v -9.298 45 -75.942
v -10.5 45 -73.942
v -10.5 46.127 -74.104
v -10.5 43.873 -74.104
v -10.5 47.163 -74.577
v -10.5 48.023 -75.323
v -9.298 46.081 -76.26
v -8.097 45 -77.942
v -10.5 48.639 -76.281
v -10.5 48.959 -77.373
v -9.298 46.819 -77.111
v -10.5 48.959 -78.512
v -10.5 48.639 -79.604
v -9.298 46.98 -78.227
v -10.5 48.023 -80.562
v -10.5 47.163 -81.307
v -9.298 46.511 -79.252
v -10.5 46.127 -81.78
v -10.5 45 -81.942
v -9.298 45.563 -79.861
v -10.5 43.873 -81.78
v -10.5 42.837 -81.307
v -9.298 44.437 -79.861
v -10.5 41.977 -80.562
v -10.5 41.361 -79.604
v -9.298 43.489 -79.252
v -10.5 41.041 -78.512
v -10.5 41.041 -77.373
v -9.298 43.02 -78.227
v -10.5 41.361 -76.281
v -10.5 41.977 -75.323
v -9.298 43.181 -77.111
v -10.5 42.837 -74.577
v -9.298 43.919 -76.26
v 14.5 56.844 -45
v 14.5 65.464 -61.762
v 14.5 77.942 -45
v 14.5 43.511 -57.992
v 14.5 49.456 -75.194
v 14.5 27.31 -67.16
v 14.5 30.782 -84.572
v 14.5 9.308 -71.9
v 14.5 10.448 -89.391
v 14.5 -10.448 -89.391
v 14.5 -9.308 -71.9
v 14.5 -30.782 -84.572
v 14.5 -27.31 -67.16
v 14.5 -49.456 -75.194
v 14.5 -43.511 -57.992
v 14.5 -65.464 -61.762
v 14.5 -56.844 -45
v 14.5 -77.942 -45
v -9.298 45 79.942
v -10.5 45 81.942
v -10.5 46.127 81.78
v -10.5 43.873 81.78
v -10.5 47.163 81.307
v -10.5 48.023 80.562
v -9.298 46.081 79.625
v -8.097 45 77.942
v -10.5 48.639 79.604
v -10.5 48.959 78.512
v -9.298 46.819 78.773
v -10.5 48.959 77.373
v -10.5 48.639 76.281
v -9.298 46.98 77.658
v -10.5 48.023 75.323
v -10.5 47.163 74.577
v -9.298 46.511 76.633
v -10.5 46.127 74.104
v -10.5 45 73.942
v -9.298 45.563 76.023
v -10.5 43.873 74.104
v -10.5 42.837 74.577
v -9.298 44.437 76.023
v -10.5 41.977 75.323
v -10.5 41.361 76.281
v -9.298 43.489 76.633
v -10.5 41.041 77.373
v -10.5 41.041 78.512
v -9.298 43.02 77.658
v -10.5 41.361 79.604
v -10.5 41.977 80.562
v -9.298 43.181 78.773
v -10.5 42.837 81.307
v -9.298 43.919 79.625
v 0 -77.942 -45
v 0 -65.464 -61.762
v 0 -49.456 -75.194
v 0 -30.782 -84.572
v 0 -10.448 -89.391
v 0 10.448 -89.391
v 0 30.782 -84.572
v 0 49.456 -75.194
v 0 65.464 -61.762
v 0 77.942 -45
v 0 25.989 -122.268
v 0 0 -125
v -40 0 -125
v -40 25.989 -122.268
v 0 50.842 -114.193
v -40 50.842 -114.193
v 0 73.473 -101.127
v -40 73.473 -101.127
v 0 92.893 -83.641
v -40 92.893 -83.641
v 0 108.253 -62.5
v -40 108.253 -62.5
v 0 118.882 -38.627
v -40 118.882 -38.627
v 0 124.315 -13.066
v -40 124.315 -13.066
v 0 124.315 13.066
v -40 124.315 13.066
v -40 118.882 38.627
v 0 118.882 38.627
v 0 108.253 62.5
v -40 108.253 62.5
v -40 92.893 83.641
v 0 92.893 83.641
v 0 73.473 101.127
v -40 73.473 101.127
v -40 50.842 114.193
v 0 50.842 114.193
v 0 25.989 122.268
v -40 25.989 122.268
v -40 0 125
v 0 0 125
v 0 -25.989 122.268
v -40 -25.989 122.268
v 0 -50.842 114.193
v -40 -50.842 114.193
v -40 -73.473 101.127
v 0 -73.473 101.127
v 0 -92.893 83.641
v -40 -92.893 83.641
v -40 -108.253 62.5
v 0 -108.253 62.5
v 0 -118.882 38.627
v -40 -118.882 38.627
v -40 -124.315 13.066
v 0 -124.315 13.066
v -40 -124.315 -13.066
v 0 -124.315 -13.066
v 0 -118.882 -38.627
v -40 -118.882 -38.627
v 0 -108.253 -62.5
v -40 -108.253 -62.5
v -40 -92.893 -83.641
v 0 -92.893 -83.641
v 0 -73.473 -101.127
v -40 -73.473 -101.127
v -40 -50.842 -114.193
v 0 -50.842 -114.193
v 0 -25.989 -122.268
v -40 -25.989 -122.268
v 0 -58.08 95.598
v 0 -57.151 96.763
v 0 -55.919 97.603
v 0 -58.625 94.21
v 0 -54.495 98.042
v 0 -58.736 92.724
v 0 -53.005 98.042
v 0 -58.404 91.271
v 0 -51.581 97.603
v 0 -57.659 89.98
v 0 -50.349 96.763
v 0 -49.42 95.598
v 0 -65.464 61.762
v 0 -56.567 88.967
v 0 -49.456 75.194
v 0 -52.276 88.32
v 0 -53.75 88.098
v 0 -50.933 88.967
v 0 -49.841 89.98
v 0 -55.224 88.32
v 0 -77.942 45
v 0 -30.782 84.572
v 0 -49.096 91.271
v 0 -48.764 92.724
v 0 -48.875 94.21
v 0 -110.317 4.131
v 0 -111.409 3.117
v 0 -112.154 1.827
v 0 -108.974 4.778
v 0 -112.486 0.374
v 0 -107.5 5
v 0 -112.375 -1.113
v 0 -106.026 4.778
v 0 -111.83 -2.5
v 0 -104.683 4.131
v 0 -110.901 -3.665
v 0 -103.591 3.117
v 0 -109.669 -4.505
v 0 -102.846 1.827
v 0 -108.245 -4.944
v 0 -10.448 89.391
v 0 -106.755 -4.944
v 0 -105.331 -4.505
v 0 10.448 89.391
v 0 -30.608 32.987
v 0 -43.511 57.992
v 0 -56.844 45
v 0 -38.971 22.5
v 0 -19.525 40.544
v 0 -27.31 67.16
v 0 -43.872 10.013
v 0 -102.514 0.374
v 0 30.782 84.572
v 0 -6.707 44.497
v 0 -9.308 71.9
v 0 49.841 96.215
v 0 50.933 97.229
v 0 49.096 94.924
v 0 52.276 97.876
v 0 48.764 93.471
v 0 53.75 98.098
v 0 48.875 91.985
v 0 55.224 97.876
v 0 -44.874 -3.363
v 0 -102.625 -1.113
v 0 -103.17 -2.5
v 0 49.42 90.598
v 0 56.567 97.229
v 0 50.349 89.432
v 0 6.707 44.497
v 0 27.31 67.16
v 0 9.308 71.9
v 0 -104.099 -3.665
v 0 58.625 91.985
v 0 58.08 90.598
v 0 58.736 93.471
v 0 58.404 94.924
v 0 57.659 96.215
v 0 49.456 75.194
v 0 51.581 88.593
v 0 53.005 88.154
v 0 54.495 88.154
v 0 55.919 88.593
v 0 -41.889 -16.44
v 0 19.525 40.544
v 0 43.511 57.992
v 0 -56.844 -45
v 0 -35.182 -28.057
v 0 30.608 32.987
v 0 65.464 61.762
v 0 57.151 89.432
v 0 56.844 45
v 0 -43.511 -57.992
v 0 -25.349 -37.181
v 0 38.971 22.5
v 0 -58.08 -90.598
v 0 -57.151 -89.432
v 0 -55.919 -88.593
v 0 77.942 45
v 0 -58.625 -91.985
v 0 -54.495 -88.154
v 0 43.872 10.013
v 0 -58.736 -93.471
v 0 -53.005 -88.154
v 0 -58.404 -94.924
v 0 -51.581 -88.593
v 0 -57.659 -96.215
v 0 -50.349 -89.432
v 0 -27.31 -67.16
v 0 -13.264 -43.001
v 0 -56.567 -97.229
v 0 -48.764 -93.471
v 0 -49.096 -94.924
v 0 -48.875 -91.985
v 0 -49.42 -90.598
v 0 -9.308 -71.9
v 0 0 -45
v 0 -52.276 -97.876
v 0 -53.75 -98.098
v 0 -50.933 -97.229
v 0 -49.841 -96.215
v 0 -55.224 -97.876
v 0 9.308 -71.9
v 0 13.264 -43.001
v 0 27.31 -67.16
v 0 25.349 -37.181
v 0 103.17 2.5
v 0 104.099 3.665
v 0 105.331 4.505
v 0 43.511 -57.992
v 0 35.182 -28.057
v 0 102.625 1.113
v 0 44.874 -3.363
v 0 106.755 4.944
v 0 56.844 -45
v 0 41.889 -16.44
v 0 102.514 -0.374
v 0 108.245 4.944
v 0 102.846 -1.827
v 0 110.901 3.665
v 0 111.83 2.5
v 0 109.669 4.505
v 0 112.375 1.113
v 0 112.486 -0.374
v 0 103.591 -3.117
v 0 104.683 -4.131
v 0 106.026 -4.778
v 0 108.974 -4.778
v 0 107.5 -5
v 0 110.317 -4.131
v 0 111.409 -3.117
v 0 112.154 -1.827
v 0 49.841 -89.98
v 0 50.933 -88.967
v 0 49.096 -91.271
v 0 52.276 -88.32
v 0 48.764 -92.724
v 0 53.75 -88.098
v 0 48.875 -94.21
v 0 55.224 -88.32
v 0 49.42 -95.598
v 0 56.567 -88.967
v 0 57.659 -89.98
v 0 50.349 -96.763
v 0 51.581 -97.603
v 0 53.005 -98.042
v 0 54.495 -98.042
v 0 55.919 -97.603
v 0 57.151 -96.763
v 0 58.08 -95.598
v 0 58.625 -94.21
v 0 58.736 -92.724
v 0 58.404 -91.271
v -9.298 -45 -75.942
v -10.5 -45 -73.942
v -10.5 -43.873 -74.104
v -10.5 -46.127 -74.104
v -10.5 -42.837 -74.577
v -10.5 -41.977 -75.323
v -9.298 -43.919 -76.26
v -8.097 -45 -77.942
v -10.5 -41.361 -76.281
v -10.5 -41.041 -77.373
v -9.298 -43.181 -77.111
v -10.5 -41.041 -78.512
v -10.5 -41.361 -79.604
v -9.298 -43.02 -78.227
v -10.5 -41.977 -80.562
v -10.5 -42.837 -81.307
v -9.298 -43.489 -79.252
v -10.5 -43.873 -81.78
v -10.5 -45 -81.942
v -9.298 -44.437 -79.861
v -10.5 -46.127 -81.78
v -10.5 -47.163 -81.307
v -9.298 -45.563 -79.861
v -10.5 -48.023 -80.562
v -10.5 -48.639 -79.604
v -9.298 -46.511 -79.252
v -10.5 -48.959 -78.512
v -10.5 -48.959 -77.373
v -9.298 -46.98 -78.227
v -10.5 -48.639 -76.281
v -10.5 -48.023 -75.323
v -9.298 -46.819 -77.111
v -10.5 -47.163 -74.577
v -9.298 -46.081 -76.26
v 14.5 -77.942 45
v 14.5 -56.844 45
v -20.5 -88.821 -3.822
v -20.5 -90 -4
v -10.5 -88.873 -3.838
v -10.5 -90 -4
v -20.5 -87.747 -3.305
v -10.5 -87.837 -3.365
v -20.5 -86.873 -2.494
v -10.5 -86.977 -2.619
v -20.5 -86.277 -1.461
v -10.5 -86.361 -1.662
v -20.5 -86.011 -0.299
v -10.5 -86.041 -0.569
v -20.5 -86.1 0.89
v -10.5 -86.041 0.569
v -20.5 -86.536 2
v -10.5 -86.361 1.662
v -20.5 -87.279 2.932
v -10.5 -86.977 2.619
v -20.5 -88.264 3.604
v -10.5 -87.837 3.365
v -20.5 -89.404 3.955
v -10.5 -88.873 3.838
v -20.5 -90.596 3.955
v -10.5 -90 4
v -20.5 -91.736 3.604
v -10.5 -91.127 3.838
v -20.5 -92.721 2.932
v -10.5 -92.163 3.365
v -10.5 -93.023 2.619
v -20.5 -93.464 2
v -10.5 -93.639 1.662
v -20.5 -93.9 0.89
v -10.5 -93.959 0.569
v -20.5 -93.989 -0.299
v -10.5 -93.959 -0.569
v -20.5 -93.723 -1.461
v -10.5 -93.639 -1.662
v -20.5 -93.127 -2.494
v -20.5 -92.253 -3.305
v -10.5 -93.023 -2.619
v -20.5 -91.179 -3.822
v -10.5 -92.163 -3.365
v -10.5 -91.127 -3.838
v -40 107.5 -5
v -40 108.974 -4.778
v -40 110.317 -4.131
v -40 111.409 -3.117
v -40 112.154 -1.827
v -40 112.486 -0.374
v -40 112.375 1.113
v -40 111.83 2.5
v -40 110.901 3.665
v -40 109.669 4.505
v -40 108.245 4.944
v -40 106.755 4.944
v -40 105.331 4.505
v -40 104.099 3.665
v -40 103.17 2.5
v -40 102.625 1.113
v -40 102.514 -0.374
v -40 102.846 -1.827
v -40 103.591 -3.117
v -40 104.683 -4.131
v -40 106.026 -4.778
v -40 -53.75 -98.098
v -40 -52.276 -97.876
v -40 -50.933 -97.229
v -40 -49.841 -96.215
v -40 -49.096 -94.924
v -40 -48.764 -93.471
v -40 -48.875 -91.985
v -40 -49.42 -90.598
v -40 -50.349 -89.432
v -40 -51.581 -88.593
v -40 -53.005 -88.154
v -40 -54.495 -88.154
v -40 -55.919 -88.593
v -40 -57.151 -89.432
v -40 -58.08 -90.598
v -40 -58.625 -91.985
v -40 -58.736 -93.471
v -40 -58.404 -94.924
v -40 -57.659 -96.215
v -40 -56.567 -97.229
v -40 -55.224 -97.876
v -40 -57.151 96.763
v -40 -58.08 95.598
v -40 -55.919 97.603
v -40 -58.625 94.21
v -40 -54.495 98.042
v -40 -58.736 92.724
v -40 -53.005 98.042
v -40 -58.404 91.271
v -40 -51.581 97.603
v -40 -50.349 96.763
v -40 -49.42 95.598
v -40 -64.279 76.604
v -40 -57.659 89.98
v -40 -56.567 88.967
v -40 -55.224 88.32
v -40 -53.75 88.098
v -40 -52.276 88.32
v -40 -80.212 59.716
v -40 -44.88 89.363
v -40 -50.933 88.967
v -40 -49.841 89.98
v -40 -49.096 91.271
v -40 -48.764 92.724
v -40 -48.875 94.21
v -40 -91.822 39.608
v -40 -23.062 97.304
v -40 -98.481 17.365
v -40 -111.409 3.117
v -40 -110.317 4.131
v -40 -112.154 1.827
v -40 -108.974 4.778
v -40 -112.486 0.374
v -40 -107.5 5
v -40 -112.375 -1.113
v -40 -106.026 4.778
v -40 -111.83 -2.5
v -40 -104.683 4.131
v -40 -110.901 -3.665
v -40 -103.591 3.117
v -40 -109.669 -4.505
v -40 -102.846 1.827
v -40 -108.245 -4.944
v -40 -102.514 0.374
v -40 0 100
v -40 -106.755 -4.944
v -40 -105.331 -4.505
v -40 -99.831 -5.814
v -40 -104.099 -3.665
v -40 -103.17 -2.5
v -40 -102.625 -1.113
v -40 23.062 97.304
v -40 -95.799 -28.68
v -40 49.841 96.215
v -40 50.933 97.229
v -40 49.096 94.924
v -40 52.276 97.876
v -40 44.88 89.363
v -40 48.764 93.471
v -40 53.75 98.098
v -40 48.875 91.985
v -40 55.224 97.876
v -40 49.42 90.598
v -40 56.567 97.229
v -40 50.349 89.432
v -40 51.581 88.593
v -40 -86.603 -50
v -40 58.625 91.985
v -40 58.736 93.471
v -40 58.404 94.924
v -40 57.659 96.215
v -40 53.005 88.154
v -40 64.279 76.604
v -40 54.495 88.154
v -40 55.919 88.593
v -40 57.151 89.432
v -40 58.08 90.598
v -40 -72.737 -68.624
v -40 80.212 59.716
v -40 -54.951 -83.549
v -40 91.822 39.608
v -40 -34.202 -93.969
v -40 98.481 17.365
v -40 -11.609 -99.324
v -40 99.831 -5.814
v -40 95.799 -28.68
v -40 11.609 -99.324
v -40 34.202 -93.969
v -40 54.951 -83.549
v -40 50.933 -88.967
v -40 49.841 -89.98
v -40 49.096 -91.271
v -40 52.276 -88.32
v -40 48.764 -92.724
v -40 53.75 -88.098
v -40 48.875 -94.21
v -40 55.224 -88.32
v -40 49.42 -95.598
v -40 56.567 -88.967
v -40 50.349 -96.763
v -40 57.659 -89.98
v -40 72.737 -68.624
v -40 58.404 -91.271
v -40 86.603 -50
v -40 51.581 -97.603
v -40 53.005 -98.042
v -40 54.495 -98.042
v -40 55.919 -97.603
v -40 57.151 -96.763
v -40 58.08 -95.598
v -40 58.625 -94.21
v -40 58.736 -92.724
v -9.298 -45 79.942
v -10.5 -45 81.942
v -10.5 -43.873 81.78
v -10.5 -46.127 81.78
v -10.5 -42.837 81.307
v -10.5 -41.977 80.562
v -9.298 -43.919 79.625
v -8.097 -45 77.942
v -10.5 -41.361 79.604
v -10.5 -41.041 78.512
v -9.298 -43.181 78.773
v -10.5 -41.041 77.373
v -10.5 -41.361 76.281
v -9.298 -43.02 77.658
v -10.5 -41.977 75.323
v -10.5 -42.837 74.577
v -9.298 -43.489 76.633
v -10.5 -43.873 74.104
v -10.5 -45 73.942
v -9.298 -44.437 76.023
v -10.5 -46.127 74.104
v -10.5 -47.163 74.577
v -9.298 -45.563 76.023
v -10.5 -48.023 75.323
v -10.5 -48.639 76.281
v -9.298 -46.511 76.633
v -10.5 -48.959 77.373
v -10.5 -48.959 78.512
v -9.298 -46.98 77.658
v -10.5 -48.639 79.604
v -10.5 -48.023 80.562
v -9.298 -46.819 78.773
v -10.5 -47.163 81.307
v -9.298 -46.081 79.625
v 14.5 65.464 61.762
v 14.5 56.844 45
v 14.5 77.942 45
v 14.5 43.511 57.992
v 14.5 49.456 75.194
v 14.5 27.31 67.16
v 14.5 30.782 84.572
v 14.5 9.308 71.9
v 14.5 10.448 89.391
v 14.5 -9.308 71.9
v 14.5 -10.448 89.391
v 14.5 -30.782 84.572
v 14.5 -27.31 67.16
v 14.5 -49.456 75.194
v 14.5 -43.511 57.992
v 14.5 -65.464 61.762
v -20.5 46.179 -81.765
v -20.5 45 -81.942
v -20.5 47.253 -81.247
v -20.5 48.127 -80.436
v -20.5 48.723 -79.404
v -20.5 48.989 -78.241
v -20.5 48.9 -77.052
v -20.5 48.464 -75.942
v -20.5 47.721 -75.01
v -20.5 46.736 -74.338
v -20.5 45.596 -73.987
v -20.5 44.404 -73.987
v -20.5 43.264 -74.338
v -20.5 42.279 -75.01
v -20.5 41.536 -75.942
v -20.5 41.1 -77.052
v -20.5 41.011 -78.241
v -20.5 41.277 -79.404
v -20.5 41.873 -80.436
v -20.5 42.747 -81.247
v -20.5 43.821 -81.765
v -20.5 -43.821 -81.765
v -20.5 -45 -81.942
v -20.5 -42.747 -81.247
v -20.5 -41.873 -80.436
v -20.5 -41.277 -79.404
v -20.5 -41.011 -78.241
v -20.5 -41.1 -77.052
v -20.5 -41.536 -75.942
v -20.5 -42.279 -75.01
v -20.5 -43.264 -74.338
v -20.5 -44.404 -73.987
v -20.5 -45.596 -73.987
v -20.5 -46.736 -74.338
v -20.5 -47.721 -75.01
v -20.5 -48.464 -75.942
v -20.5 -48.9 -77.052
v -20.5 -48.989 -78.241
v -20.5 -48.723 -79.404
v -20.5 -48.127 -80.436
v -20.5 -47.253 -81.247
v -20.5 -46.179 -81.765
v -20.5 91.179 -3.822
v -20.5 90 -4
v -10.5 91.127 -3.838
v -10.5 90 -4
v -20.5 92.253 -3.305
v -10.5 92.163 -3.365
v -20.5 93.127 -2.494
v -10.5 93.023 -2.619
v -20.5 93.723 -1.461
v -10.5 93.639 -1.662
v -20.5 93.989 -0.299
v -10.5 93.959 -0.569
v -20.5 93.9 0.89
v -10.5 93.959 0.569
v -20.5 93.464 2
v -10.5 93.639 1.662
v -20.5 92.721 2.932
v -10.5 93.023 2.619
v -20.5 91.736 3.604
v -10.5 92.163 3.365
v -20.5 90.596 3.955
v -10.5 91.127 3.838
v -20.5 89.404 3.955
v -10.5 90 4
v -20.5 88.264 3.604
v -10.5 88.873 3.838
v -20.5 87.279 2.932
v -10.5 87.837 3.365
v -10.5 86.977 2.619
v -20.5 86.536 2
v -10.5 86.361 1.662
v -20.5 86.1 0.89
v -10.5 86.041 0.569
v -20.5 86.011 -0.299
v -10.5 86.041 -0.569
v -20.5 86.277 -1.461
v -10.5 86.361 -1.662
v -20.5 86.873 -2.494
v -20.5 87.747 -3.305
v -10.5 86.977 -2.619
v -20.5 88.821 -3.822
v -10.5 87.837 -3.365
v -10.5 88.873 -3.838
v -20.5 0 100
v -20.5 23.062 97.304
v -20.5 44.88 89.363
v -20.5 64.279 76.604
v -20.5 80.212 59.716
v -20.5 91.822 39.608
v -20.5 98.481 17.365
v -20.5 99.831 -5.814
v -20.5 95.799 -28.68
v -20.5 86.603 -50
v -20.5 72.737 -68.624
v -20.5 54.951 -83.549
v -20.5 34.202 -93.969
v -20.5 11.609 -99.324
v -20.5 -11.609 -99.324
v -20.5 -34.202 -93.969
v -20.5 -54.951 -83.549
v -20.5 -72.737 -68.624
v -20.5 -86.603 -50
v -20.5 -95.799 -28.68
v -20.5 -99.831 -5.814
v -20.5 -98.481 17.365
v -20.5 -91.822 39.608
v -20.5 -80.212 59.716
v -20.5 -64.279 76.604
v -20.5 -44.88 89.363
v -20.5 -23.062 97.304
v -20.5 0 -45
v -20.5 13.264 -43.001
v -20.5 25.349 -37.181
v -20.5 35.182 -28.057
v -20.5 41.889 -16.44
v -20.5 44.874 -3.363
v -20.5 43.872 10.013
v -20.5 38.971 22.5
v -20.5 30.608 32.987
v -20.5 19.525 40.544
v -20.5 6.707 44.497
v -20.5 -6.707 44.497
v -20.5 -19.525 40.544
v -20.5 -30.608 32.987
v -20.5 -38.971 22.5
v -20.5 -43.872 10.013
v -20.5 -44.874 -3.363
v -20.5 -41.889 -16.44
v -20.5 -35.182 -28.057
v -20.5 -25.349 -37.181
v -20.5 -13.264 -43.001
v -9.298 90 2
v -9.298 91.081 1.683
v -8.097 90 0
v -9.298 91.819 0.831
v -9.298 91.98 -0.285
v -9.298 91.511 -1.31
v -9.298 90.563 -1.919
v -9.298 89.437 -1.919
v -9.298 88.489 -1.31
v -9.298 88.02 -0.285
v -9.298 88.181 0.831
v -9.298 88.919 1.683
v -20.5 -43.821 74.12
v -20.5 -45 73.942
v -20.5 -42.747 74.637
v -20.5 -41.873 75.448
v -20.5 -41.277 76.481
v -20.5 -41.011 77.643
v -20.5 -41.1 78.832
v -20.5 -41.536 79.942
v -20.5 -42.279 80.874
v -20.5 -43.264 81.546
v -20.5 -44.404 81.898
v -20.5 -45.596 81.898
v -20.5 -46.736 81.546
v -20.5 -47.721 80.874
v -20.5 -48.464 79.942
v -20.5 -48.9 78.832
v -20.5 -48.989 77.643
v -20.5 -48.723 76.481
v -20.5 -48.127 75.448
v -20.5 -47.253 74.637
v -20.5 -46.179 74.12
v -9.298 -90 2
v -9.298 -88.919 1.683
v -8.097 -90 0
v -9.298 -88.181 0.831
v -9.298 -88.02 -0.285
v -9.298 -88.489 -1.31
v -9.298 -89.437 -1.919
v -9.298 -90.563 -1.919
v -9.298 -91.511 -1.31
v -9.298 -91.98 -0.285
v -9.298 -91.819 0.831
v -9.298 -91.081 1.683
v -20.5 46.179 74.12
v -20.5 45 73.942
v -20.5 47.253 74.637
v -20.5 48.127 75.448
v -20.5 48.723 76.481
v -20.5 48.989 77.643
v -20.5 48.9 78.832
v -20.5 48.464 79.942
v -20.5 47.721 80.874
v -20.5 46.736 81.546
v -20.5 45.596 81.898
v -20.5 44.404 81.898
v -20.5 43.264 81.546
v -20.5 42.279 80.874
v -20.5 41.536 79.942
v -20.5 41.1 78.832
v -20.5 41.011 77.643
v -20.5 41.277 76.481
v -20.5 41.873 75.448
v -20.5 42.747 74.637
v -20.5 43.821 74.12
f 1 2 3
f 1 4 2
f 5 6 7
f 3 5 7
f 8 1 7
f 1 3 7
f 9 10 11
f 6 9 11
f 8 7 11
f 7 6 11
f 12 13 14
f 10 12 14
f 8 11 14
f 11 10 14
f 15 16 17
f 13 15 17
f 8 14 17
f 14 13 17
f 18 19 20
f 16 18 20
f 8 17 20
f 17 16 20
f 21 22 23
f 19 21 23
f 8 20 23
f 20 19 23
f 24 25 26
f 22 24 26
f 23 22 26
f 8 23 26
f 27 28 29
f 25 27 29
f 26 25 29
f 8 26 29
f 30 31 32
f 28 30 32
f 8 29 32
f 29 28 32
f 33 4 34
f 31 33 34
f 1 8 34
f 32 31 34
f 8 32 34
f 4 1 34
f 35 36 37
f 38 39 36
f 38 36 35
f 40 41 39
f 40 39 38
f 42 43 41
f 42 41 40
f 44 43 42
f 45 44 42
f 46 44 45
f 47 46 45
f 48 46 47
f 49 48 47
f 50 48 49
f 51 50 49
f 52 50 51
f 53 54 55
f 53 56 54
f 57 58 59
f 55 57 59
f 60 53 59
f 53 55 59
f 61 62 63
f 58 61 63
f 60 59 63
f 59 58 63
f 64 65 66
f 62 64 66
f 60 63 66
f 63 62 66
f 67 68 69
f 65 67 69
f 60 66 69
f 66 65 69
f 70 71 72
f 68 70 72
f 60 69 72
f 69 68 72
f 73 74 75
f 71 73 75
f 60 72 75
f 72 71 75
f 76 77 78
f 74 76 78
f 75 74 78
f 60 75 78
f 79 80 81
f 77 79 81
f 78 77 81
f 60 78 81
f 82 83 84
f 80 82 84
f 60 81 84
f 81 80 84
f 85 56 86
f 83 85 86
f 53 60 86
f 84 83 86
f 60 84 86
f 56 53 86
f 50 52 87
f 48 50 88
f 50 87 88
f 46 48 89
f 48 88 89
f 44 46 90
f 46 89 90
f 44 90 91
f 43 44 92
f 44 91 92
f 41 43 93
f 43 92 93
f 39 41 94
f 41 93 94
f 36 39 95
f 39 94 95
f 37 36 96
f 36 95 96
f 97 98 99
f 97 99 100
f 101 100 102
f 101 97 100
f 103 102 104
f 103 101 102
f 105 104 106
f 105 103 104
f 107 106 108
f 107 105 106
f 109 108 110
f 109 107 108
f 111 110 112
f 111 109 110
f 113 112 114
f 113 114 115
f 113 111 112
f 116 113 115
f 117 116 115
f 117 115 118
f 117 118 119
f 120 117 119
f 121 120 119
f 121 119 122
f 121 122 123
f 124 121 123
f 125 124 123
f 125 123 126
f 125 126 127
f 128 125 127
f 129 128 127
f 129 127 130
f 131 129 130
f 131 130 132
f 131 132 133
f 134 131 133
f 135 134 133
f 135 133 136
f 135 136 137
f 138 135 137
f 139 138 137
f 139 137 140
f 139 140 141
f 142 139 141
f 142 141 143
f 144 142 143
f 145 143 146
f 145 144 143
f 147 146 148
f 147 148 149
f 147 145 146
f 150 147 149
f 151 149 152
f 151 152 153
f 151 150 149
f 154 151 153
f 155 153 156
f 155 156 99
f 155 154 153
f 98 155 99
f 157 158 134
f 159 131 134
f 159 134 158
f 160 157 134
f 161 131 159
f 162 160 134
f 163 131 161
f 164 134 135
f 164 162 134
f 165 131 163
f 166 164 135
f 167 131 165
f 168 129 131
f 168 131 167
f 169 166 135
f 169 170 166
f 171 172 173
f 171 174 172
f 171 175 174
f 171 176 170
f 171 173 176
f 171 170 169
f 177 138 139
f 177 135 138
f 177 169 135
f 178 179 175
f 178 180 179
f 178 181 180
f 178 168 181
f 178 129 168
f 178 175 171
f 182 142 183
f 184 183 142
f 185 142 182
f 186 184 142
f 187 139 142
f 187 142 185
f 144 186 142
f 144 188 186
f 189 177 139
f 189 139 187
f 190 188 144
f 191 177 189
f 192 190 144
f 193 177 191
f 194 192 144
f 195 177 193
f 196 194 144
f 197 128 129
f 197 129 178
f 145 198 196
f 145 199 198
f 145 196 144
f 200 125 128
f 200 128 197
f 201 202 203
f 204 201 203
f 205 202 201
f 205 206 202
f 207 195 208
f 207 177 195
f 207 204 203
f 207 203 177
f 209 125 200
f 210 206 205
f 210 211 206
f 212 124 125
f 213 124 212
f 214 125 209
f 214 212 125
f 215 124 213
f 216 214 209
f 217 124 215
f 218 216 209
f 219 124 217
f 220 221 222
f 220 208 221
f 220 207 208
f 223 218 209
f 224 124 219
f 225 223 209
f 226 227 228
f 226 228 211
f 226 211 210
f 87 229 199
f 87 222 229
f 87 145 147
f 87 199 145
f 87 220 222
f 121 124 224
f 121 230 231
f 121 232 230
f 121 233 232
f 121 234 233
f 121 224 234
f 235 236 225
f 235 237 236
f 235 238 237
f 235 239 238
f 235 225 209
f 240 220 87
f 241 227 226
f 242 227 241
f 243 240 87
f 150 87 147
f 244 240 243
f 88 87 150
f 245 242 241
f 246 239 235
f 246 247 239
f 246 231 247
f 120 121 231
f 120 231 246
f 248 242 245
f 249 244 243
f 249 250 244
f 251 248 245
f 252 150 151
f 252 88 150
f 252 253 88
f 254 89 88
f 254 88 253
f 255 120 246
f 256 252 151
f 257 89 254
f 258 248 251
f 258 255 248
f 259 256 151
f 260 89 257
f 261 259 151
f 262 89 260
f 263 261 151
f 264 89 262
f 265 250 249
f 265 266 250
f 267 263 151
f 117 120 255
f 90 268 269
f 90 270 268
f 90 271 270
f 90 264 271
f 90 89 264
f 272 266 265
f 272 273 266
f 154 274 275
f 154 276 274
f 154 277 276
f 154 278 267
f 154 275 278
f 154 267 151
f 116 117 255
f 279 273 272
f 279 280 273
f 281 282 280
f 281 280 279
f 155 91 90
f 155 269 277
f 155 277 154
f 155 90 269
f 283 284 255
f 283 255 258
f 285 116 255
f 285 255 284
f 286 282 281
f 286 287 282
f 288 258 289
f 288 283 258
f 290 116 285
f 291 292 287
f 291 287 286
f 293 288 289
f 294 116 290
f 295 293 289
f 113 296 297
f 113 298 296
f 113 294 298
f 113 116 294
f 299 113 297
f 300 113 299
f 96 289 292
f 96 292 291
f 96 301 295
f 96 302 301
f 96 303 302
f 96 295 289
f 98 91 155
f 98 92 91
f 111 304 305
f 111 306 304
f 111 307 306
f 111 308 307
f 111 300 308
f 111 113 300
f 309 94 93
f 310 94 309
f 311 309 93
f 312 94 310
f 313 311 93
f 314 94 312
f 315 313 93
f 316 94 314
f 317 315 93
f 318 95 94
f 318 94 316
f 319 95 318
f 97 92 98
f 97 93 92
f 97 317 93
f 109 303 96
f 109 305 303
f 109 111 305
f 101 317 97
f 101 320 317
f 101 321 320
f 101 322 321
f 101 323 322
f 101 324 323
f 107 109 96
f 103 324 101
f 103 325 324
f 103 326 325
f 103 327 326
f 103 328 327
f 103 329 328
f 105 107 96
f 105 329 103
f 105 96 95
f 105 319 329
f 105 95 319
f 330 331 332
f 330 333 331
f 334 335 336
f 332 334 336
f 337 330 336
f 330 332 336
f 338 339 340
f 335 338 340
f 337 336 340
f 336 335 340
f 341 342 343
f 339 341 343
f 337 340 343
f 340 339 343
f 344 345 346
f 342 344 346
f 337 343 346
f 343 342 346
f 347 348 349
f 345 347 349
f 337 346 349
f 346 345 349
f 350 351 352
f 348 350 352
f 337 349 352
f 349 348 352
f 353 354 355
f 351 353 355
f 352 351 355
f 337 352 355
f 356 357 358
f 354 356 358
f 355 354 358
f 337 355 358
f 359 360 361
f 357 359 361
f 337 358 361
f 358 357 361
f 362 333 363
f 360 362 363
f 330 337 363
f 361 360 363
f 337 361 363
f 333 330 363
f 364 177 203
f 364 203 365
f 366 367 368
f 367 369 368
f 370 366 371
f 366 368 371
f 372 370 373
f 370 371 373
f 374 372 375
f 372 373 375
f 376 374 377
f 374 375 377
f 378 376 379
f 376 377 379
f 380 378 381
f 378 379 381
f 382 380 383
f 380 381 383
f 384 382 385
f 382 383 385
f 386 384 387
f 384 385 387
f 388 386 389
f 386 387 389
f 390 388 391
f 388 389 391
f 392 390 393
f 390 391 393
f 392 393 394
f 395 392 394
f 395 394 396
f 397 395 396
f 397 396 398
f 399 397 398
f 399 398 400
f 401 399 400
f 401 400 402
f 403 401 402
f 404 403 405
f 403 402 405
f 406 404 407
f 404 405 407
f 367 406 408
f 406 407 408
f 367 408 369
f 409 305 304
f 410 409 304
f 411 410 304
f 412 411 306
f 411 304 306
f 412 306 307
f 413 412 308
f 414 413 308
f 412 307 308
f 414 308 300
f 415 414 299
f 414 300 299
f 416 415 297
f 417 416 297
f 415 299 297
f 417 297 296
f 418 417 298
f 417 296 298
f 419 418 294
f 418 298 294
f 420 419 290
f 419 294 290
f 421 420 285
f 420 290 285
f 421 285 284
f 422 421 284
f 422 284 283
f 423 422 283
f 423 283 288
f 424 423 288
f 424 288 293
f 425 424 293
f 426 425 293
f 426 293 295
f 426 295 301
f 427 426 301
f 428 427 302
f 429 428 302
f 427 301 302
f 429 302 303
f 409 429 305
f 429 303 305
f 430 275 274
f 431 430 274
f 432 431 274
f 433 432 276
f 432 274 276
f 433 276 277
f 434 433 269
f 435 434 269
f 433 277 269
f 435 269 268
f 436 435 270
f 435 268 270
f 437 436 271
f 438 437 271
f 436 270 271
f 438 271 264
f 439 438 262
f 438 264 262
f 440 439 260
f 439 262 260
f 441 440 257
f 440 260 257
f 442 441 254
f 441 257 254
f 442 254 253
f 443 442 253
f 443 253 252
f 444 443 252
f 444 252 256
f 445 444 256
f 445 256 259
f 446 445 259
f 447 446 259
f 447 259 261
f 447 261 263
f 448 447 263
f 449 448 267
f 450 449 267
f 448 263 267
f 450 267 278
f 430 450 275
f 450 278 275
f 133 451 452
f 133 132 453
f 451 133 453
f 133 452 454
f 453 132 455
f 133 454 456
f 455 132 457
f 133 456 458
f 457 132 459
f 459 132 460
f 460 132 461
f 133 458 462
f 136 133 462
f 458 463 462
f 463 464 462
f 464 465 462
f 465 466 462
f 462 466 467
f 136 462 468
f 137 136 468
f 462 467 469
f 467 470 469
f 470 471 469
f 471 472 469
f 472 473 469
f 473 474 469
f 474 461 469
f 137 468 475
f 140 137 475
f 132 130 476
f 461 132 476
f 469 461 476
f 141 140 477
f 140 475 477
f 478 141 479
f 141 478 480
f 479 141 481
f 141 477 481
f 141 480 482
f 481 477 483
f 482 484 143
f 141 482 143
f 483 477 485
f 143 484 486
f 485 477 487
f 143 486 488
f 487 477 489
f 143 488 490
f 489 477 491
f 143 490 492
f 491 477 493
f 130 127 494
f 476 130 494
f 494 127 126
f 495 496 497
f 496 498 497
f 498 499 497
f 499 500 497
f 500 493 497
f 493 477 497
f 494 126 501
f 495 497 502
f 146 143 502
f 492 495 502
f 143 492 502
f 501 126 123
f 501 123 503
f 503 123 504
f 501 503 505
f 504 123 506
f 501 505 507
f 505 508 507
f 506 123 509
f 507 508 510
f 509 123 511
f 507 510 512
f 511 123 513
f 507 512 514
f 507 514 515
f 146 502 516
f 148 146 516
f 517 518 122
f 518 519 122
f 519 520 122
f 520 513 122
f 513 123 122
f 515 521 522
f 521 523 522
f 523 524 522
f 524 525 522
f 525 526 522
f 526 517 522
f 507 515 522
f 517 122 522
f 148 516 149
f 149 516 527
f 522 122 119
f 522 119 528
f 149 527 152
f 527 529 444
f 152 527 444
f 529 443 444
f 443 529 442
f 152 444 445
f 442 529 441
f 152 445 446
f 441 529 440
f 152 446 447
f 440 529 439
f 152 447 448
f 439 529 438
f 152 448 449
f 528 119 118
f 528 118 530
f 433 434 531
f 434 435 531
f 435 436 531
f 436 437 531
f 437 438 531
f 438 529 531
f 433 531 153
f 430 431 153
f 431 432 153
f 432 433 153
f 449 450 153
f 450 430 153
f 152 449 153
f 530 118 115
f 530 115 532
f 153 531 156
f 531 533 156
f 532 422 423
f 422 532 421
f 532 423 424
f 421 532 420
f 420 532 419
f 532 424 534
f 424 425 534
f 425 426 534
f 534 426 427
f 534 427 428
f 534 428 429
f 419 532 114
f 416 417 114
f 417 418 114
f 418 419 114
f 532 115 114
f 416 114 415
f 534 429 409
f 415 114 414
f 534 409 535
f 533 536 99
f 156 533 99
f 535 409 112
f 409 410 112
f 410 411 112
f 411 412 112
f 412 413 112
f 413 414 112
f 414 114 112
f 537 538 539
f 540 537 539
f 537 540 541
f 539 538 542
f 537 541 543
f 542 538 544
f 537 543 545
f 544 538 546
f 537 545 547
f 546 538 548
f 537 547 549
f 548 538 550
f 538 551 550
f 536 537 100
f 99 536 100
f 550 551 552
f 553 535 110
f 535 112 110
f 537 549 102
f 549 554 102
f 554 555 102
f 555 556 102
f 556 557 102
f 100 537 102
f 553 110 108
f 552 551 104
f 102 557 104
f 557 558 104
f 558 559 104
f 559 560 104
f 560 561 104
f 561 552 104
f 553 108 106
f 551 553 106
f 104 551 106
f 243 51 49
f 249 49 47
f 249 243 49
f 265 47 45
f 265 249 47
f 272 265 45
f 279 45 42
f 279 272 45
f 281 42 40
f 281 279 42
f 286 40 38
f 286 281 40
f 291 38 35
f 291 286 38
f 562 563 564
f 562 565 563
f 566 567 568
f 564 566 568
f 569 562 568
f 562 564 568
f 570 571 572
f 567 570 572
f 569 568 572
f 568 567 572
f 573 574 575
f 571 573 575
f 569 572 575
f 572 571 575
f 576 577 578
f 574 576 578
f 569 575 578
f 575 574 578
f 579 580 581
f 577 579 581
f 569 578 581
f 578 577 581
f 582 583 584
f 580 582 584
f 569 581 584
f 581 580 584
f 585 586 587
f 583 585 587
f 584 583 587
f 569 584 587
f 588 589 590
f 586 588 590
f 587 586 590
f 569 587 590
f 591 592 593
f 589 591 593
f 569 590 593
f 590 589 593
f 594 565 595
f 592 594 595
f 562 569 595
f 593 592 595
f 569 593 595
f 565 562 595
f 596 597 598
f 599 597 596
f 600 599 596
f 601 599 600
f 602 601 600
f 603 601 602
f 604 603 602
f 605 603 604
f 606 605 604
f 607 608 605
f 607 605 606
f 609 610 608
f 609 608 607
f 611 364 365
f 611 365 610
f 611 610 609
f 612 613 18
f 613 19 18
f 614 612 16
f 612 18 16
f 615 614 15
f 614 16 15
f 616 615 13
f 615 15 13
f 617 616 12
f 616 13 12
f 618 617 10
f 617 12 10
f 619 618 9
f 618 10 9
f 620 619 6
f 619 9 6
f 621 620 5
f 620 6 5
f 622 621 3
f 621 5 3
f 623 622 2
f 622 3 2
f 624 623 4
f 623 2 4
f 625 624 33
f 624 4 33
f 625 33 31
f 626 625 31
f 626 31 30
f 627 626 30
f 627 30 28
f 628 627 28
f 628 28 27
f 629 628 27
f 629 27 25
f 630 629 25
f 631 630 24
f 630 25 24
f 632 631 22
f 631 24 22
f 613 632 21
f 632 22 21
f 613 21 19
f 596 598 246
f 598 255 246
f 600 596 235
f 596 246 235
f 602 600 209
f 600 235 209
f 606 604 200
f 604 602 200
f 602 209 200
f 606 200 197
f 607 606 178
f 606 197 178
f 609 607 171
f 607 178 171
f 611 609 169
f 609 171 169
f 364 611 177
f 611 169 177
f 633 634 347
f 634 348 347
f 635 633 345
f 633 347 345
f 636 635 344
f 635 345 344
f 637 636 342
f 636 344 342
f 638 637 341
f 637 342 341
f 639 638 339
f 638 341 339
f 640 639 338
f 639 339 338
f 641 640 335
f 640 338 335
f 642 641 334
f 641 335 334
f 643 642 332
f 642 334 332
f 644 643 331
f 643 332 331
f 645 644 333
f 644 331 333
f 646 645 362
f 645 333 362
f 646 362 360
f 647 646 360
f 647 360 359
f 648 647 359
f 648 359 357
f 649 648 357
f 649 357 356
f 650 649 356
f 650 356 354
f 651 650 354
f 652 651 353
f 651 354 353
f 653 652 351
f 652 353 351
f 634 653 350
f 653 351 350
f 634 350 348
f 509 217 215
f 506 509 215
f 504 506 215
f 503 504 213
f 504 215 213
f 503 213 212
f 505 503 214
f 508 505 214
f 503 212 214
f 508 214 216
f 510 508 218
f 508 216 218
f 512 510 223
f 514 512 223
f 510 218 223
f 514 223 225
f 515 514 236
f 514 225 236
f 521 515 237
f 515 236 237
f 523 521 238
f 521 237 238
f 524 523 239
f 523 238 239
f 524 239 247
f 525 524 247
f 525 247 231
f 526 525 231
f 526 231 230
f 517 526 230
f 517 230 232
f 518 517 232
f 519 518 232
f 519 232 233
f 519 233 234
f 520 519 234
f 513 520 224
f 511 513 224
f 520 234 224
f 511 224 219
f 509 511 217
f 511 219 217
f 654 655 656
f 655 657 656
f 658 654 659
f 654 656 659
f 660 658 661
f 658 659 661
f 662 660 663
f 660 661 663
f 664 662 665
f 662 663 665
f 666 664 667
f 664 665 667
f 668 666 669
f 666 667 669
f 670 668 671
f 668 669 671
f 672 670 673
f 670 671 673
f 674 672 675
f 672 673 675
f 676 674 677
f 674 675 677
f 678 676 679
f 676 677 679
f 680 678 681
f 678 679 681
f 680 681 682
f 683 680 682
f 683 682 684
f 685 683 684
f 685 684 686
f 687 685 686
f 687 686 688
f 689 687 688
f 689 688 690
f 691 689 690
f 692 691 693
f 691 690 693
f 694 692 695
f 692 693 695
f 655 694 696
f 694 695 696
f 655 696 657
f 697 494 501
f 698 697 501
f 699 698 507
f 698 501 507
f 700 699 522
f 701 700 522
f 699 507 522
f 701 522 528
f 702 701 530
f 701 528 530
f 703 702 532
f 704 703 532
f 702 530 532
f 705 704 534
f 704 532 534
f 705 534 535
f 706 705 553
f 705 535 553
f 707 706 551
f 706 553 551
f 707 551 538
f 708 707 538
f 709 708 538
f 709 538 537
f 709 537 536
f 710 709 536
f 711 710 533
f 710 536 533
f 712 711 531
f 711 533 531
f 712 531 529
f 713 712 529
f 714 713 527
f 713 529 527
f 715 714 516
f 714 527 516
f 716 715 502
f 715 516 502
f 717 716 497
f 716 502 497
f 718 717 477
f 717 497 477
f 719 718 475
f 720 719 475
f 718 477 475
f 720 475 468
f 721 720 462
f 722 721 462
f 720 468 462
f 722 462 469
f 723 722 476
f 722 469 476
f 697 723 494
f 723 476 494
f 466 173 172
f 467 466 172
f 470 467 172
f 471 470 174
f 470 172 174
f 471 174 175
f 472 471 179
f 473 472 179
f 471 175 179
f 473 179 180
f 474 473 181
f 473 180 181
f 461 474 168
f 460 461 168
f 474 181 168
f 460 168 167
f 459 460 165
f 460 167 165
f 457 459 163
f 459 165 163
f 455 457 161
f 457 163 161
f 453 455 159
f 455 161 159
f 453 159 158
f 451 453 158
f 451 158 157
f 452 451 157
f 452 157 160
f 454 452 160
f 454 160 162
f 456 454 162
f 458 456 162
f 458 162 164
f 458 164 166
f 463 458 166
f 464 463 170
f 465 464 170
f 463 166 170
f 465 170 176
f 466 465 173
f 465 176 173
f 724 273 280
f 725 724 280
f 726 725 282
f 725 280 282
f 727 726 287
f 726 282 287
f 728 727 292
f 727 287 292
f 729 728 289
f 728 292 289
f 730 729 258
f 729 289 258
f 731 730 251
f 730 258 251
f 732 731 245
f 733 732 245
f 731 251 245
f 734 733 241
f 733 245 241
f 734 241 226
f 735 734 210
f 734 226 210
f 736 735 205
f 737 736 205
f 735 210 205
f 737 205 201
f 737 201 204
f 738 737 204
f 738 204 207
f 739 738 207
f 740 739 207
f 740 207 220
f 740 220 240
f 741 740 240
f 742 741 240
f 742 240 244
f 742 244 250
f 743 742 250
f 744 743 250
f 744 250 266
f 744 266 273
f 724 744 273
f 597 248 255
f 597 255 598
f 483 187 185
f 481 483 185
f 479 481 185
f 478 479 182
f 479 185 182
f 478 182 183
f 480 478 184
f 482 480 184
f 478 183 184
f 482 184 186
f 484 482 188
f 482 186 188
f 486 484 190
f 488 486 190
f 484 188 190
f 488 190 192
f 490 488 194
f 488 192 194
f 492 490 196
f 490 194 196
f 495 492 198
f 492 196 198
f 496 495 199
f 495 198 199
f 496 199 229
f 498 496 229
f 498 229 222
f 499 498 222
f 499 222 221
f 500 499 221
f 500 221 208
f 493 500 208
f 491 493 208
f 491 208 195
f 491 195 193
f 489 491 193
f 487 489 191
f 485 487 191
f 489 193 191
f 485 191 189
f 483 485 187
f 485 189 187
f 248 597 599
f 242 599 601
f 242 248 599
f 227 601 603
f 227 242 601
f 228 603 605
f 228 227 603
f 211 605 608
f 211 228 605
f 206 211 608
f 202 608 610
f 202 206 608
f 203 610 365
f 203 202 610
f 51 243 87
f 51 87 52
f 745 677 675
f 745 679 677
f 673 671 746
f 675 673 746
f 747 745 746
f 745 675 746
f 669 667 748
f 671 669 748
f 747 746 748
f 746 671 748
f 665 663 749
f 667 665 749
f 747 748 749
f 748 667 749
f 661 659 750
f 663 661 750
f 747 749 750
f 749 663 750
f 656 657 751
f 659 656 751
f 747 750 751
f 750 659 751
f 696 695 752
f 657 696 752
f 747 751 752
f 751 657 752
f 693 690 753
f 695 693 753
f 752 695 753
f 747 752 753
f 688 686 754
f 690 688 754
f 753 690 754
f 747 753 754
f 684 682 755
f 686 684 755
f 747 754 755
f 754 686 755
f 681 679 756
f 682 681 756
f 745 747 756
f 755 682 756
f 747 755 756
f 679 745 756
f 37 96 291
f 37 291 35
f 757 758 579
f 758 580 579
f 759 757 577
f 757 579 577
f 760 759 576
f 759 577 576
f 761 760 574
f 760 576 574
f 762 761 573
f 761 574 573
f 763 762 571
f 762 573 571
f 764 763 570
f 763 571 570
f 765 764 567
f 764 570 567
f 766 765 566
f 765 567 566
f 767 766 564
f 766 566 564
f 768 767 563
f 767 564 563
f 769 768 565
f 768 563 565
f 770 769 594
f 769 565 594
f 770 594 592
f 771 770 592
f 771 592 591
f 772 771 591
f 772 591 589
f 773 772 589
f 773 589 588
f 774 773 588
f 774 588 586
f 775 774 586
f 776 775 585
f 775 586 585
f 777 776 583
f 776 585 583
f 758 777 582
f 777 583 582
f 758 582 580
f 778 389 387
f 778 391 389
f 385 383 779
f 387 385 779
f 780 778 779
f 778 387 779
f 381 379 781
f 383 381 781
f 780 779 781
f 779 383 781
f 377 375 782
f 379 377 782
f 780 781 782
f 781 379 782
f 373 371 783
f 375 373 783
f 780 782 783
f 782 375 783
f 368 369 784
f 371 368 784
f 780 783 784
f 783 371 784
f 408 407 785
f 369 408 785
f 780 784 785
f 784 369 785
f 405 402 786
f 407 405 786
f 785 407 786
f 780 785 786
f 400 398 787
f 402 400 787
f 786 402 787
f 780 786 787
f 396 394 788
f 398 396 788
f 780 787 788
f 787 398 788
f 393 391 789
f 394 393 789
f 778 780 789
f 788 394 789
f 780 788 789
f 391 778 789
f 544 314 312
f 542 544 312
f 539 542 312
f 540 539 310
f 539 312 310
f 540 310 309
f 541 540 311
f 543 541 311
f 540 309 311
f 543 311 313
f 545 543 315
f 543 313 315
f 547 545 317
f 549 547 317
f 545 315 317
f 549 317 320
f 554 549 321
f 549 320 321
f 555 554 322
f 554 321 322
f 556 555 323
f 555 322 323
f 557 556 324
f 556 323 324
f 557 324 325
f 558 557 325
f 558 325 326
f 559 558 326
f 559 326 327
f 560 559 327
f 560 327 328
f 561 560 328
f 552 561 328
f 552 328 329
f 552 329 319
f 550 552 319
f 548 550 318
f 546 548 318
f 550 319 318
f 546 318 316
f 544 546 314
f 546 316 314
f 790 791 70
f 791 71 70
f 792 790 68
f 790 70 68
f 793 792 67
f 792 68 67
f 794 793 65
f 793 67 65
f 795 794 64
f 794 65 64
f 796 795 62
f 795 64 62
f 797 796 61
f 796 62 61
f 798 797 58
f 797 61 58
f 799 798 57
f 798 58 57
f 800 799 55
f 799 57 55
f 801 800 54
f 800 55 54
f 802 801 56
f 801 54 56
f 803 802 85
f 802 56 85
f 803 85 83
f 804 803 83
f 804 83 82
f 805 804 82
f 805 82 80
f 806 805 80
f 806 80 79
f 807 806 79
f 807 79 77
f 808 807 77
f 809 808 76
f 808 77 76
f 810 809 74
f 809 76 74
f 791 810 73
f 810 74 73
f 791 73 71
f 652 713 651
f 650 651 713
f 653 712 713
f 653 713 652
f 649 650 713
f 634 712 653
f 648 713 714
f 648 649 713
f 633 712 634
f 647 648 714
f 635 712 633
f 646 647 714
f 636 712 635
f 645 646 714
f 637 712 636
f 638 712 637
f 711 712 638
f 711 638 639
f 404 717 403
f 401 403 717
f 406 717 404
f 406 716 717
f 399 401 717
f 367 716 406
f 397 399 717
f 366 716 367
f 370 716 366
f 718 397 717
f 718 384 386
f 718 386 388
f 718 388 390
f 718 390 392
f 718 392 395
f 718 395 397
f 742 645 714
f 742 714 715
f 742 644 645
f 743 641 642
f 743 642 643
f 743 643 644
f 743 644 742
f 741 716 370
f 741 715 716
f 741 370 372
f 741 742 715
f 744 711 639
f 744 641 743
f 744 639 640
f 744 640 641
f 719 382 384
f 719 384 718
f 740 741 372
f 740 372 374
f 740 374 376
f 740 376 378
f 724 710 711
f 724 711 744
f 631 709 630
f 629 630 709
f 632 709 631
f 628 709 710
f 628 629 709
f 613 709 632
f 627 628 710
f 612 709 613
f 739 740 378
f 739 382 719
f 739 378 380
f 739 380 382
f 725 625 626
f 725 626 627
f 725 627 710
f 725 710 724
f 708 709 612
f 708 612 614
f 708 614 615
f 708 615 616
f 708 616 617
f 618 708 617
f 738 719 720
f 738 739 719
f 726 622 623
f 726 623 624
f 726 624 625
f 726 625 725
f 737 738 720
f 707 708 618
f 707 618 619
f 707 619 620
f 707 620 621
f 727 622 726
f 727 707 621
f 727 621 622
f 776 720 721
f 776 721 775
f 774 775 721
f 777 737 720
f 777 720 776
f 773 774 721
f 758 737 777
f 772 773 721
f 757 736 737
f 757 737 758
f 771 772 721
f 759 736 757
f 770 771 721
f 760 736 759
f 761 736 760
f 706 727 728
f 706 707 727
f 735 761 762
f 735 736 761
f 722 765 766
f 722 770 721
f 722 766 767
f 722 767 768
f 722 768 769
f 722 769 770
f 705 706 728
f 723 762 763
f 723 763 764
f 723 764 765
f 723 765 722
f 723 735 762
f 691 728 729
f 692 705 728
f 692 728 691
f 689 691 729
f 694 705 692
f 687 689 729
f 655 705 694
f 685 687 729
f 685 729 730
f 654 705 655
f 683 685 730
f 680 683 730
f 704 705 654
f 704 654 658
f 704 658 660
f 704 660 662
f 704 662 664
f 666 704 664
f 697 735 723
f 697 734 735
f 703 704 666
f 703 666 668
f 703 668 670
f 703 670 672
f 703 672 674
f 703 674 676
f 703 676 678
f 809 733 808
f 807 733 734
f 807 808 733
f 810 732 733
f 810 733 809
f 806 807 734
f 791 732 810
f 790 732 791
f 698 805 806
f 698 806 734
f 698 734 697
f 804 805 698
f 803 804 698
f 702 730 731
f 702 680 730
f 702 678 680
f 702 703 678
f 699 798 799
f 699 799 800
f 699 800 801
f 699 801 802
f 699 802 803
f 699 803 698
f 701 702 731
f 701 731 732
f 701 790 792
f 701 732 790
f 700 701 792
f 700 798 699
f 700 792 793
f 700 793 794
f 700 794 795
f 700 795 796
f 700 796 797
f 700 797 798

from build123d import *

# Parameters (mm, degrees)
SKETCH1_R                 = 125
SKETCH1_R_2               = 45
SKETCH1_R_3               = 5
BOSS_EXTRUDE1_DEPTH       = 40
SKETCH3_R                 = 90
SKETCH3_R_2               = 72.5
BOSS_EXTRUDE2_DEPTH       = 14.5
CUT_EXTRUDE1_DEPTH        = 182.245689604
CUT_EXTRUDE1_DEPTH_BACK   = 182.245689604
SKETCH4_W                 = 14.5
SKETCH4_H                 = 90
SKETCH5_R                 = 100
CUT_EXTRUDE3_DEPTH        = 19.5
F_8_0MM_DOWEL_HOLE1_D     = 8
F_8_0MM_DOWEL_HOLE1_DEPTH = 10
F_8_0MM_DOWEL_HOLE1_TIP   = 2.403442476


with BuildPart() as part:
    # Sketch1 → Boss-Extrude1 (new body)
    with BuildSketch(Plane(origin=(0, 0, 0), x_dir=(0, 0, -1), z_dir=(1, 0, 0))):
        Circle(SKETCH1_R)
        Circle(SKETCH1_R_2, mode=Mode.SUBTRACT)
        with Locations((0, 107.5)):
            Circle(SKETCH1_R_3, mode=Mode.SUBTRACT)
        with Locations(Location((93.097730907, 53.75, 0), (0, 0, 180))):
            Circle(SKETCH1_R_3, mode=Mode.SUBTRACT)
        with Locations(Location((-93.097730907, 53.75, 0), (0, 0, 180))):
            Circle(SKETCH1_R_3, mode=Mode.SUBTRACT)
        with Locations((-93.097730907, -53.75)):
            Circle(SKETCH1_R_3, mode=Mode.SUBTRACT)
        with Locations(Location((0, -107.5, 0), (0, 0, 180))):
            Circle(SKETCH1_R_3, mode=Mode.SUBTRACT)
        with Locations((93.097730907, -53.75)):
            Circle(SKETCH1_R_3, mode=Mode.SUBTRACT)
    extrude(amount=-BOSS_EXTRUDE1_DEPTH)

    # Sketch3 → Boss-Extrude2 (add)
    with BuildSketch(Plane(origin=(0, 0, 0), x_dir=(0, 0, -1), z_dir=(1, 0, 0))):
        with Locations(Location((0, 0, 0), (0, 0, 180))):
            Circle(SKETCH3_R)
        with Locations(Location((0, 0, 0), (0, 0, 180))):
            Circle(SKETCH3_R_2, mode=Mode.SUBTRACT)
    extrude(amount=BOSS_EXTRUDE2_DEPTH)

    # Sketch4 → Cut-Extrude1 (cut, two sides: drawn at the far end of the back side and taken through both)
    with BuildSketch(Plane(origin=(0, 0, 0), x_dir=(1, 0, 0), z_dir=(0, 1, 0)).offset(-CUT_EXTRUDE1_DEPTH_BACK)):
        with Locations((7.25, 0)):
            Rectangle(SKETCH4_W, SKETCH4_H)
    extrude(amount=CUT_EXTRUDE1_DEPTH + CUT_EXTRUDE1_DEPTH_BACK, mode=Mode.SUBTRACT)

    # Sketch5 → Cut-Extrude3 (cut)
    with BuildSketch(Plane.ZY.offset(40)):
        Circle(SKETCH5_R)
    extrude(amount=-CUT_EXTRUDE3_DEPTH, mode=Mode.SUBTRACT)

    # Ø8.0mm Dowel Hole1
    with Locations(Plane.ZY.offset(20.5)):
        with Locations((0, 90), (77.942286341, 45), (77.942286341, -45), (0, -90), (-77.942286341, -45), (-77.942286341, 45)):
            Hole(F_8_0MM_DOWEL_HOLE1_D / 2, depth=F_8_0MM_DOWEL_HOLE1_DEPTH)
            with Locations((0, 0, -(F_8_0MM_DOWEL_HOLE1_DEPTH + F_8_0MM_DOWEL_HOLE1_TIP / 2))):  # 118° drill point
                Cone(0, F_8_0MM_DOWEL_HOLE1_D / 2, F_8_0MM_DOWEL_HOLE1_TIP, mode=Mode.SUBTRACT)


solid = part.part
